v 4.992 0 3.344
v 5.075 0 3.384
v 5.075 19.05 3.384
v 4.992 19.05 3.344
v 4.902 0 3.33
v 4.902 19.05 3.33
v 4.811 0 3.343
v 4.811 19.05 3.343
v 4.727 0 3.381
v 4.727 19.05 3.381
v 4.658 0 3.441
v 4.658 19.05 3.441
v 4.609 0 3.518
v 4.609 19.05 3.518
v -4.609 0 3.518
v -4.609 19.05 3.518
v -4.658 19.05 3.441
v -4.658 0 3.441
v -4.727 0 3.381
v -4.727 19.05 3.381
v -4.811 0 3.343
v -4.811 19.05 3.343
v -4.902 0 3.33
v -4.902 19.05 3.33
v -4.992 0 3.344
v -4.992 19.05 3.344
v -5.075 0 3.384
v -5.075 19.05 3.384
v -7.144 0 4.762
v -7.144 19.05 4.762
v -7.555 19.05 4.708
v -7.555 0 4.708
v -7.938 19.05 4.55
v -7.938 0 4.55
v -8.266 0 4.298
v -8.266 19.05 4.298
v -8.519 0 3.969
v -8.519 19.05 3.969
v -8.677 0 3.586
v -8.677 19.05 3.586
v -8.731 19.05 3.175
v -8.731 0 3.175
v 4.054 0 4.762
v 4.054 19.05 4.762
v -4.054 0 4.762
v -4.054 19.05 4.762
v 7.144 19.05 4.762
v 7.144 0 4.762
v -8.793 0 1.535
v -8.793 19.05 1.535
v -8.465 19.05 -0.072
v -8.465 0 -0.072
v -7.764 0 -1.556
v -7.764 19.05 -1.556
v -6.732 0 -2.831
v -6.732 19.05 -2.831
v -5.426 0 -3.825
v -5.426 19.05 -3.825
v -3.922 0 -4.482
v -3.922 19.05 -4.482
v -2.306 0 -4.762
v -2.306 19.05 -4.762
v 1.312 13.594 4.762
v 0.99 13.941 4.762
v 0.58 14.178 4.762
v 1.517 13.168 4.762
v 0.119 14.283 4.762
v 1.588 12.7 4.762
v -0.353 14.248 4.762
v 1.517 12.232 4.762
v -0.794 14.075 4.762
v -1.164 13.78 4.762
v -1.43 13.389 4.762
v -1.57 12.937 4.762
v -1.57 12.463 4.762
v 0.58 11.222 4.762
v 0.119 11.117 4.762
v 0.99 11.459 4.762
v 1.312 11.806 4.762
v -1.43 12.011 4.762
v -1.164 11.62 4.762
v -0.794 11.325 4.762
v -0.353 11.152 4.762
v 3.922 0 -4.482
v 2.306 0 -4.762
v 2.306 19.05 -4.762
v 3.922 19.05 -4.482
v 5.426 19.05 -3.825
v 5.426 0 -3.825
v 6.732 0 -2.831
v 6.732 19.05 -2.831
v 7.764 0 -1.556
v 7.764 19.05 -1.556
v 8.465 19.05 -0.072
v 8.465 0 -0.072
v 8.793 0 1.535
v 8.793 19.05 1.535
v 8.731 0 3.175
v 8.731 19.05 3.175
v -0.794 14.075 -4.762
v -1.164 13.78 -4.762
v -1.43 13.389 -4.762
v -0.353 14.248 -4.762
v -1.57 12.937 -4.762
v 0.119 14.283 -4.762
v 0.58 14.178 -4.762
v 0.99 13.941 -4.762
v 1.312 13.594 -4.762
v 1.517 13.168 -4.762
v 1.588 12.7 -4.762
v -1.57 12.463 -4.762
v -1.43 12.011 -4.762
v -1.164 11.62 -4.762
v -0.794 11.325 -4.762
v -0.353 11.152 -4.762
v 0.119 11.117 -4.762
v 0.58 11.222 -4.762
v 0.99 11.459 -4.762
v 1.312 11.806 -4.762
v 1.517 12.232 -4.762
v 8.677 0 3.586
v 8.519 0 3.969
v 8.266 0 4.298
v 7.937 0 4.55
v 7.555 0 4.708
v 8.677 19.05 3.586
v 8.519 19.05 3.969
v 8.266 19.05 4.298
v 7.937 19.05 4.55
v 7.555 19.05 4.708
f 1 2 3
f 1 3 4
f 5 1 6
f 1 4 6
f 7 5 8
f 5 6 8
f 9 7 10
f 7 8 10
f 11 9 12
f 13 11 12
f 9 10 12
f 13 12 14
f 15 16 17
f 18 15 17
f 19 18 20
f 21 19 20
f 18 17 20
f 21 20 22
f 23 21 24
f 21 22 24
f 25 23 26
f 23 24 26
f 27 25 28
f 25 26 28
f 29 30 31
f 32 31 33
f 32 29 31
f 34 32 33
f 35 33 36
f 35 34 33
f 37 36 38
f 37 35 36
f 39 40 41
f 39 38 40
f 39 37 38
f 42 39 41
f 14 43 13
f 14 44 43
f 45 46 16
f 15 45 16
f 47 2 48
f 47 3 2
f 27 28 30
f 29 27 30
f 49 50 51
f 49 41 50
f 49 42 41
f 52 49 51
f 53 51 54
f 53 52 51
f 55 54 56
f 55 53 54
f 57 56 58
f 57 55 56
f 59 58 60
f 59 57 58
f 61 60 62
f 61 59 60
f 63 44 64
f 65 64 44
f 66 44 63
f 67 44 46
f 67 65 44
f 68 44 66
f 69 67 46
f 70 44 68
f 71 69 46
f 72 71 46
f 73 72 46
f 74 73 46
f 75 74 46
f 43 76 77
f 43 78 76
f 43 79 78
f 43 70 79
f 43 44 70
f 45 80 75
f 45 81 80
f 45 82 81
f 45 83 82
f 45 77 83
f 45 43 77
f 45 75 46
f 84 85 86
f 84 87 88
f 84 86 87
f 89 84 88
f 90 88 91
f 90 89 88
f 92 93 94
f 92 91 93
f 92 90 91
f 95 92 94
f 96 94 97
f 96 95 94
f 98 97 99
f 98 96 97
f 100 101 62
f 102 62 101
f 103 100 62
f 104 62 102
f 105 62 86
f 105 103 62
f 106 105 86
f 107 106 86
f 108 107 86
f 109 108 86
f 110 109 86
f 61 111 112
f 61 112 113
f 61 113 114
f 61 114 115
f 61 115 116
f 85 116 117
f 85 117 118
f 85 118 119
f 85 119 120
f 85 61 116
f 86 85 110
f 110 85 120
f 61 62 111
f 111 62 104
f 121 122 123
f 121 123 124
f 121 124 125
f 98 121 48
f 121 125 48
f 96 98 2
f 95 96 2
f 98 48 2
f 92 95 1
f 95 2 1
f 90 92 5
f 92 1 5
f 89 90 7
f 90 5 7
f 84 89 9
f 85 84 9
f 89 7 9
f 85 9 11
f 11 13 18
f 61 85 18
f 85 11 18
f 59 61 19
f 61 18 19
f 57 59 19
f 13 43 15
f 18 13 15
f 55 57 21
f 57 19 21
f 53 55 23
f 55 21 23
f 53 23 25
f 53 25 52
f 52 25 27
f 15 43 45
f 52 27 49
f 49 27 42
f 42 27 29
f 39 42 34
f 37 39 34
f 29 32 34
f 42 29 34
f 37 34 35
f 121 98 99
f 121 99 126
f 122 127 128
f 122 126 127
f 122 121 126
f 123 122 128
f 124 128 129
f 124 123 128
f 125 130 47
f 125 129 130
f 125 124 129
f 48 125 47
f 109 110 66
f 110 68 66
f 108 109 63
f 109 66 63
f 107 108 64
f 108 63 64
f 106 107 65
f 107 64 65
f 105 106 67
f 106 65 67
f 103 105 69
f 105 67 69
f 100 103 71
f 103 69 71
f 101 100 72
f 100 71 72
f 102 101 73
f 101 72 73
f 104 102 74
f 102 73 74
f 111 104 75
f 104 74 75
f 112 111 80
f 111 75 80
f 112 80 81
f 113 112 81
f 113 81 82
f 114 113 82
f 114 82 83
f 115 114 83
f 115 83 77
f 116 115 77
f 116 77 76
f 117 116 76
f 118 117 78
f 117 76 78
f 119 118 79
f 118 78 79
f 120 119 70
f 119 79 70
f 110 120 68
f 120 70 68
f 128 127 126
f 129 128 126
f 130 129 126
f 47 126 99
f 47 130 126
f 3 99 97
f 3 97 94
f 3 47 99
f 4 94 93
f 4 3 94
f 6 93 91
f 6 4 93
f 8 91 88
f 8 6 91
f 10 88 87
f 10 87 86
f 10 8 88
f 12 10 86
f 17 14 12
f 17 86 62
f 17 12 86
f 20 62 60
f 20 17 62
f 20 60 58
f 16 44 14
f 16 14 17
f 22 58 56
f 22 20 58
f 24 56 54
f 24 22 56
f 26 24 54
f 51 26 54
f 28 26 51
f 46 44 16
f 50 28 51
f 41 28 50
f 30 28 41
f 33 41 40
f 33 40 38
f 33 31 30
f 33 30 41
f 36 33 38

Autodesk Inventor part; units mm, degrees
ref_plane "YZ Plane" through (0, 0, 0) normal (1, 0, 0) x (0, 1, 0)
ref_plane "XZ Plane" through (0, 0, 0) normal (0, 1, 0) x (-1, 0, 0)
ref_plane "XY Plane" through (0, 0, 0) normal (0, 0, 1) x (1, 0, 0)
sketch "Sketch1" plane through (0, 0, 0) normal (0, 1, 0) x (-1, 0, 0)
  line L0 (2.3057, -4.7625) -> (-8.7313, -4.7625)
  line L1 (-7.1437, 4.7625) -> (7.1438, 4.7625)
  line L2 (8.7313, -4.7625) -> (-8.7313, 4.7625) construction
  line L3 (-8.7313, -4.7625) -> (8.7313, 4.7625) construction
  arc A0 (8.7313, 3.175) -> (7.1438, 4.7625) centre (7.1438, 3.175) ccw
  arc A1 (-7.1437, 4.7625) -> (-8.7313, 3.175) centre (-7.1437, 3.175) ccw
  line L4 (0, -4.7625) -> (-1.5875, -4.7625)
  line L5 (0, -4.7625) -> (1.5875, -4.7625)
  arc A2 (1.5875, -4.7625) -> (8.7313, 3.175) centre (1.9466, 2.0978) ccw
  line L6 (0, -11.8883) -> (0, 12.0323) construction
  arc A3 (-8.7313, 3.175) -> (-1.5875, -4.7625) centre (-1.9466, 2.0978) ccw
  point P0 (0, 0)
  point P1 (-2.3057, -4.7625)
  dimension "d0" = 17.4625
  dimension "d1" = 9.525
  dimension "d2" = 1.5875
  dimension "d3" = 1.5875
  dimension "d4" = 1.5875
  dimension "d5" = 1.5875
extrude "Extrusion1" add sketch "Sketch1" along normal blind 19.05 contours L0 A3 A1 L1 A0 A2
sketch "Sketch2" plane through (0, 19.05, 0) normal (0, 1, 0) x (1, 0, 0)
  line L0 (-7.1438, -4.7625) -> (7.1437, -4.7625) projected
  line L1 (8.8162, 2.8402) -> (8.8162, -4.7625) construction
  arc A0 (8.7313, -3.175) -> (2.3057, 4.7625) centre (1.9466, -2.0978) ccw construction
  line L2 (4.0537, -4.7625) -> (4.6092, -3.5183)
  line L3 (5.0753, -3.3835) -> (7.1437, -4.7625)
  line L4 (4.0537, -4.7625) -> (7.1437, -4.7625)
  arc A1 (5.0753, -3.3835) -> (4.6092, -3.5183) centre (4.8992, -3.6477) ccw
  line L5 (4.0537, -4.7625) -> (7.1437, -4.7625)
  line L6 (4.0537, -4.7625) -> (7.1437, -4.7625)
  line L7 (2.3057, 4.7625) -> (-2.3057, 4.7625) construction
  line L8 (0, 4.7625) -> (0, -4.7625) construction
  line L9 (-4.0537, -4.7625) -> (-4.6092, -3.5183)
  line L10 (-5.0753, -3.3835) -> (-7.1438, -4.7625)
  line L11 (-4.0537, -4.7625) -> (-7.1438, -4.7625)
  arc A2 (-4.6092, -3.5183) -> (-5.0753, -3.3835) centre (-4.8992, -3.6477) ccw
  line L12 (-4.0537, -4.7625) -> (-7.1438, -4.7625)
  line L13 (-4.0537, -4.7625) -> (-7.1438, -4.7625)
  point P0 (0, 0)
  dimension "d8" = 4.7625
  dimension "d9" = 0.3175
extrude "Extrusion2" cut sketch "Sketch2" against normal blind 19.05
sketch "Sketch3" plane through (-4.0537, 0, 4.7625) normal (0, 0, 1) x (1, 0, 0)
  circle A0 centre (4.0537, 12.7) radius 1.5875
  line L0 (0, 0) -> (8.1075, 0) projected
  point P0 (4.0537, 0)
  dimension "d12" = 3.175
  dimension "d13" = 12.7
extrude "Extrusion3" cut sketch "Sketch3" against normal blind 19.05
properties part number "Curved Slider v1.0"
